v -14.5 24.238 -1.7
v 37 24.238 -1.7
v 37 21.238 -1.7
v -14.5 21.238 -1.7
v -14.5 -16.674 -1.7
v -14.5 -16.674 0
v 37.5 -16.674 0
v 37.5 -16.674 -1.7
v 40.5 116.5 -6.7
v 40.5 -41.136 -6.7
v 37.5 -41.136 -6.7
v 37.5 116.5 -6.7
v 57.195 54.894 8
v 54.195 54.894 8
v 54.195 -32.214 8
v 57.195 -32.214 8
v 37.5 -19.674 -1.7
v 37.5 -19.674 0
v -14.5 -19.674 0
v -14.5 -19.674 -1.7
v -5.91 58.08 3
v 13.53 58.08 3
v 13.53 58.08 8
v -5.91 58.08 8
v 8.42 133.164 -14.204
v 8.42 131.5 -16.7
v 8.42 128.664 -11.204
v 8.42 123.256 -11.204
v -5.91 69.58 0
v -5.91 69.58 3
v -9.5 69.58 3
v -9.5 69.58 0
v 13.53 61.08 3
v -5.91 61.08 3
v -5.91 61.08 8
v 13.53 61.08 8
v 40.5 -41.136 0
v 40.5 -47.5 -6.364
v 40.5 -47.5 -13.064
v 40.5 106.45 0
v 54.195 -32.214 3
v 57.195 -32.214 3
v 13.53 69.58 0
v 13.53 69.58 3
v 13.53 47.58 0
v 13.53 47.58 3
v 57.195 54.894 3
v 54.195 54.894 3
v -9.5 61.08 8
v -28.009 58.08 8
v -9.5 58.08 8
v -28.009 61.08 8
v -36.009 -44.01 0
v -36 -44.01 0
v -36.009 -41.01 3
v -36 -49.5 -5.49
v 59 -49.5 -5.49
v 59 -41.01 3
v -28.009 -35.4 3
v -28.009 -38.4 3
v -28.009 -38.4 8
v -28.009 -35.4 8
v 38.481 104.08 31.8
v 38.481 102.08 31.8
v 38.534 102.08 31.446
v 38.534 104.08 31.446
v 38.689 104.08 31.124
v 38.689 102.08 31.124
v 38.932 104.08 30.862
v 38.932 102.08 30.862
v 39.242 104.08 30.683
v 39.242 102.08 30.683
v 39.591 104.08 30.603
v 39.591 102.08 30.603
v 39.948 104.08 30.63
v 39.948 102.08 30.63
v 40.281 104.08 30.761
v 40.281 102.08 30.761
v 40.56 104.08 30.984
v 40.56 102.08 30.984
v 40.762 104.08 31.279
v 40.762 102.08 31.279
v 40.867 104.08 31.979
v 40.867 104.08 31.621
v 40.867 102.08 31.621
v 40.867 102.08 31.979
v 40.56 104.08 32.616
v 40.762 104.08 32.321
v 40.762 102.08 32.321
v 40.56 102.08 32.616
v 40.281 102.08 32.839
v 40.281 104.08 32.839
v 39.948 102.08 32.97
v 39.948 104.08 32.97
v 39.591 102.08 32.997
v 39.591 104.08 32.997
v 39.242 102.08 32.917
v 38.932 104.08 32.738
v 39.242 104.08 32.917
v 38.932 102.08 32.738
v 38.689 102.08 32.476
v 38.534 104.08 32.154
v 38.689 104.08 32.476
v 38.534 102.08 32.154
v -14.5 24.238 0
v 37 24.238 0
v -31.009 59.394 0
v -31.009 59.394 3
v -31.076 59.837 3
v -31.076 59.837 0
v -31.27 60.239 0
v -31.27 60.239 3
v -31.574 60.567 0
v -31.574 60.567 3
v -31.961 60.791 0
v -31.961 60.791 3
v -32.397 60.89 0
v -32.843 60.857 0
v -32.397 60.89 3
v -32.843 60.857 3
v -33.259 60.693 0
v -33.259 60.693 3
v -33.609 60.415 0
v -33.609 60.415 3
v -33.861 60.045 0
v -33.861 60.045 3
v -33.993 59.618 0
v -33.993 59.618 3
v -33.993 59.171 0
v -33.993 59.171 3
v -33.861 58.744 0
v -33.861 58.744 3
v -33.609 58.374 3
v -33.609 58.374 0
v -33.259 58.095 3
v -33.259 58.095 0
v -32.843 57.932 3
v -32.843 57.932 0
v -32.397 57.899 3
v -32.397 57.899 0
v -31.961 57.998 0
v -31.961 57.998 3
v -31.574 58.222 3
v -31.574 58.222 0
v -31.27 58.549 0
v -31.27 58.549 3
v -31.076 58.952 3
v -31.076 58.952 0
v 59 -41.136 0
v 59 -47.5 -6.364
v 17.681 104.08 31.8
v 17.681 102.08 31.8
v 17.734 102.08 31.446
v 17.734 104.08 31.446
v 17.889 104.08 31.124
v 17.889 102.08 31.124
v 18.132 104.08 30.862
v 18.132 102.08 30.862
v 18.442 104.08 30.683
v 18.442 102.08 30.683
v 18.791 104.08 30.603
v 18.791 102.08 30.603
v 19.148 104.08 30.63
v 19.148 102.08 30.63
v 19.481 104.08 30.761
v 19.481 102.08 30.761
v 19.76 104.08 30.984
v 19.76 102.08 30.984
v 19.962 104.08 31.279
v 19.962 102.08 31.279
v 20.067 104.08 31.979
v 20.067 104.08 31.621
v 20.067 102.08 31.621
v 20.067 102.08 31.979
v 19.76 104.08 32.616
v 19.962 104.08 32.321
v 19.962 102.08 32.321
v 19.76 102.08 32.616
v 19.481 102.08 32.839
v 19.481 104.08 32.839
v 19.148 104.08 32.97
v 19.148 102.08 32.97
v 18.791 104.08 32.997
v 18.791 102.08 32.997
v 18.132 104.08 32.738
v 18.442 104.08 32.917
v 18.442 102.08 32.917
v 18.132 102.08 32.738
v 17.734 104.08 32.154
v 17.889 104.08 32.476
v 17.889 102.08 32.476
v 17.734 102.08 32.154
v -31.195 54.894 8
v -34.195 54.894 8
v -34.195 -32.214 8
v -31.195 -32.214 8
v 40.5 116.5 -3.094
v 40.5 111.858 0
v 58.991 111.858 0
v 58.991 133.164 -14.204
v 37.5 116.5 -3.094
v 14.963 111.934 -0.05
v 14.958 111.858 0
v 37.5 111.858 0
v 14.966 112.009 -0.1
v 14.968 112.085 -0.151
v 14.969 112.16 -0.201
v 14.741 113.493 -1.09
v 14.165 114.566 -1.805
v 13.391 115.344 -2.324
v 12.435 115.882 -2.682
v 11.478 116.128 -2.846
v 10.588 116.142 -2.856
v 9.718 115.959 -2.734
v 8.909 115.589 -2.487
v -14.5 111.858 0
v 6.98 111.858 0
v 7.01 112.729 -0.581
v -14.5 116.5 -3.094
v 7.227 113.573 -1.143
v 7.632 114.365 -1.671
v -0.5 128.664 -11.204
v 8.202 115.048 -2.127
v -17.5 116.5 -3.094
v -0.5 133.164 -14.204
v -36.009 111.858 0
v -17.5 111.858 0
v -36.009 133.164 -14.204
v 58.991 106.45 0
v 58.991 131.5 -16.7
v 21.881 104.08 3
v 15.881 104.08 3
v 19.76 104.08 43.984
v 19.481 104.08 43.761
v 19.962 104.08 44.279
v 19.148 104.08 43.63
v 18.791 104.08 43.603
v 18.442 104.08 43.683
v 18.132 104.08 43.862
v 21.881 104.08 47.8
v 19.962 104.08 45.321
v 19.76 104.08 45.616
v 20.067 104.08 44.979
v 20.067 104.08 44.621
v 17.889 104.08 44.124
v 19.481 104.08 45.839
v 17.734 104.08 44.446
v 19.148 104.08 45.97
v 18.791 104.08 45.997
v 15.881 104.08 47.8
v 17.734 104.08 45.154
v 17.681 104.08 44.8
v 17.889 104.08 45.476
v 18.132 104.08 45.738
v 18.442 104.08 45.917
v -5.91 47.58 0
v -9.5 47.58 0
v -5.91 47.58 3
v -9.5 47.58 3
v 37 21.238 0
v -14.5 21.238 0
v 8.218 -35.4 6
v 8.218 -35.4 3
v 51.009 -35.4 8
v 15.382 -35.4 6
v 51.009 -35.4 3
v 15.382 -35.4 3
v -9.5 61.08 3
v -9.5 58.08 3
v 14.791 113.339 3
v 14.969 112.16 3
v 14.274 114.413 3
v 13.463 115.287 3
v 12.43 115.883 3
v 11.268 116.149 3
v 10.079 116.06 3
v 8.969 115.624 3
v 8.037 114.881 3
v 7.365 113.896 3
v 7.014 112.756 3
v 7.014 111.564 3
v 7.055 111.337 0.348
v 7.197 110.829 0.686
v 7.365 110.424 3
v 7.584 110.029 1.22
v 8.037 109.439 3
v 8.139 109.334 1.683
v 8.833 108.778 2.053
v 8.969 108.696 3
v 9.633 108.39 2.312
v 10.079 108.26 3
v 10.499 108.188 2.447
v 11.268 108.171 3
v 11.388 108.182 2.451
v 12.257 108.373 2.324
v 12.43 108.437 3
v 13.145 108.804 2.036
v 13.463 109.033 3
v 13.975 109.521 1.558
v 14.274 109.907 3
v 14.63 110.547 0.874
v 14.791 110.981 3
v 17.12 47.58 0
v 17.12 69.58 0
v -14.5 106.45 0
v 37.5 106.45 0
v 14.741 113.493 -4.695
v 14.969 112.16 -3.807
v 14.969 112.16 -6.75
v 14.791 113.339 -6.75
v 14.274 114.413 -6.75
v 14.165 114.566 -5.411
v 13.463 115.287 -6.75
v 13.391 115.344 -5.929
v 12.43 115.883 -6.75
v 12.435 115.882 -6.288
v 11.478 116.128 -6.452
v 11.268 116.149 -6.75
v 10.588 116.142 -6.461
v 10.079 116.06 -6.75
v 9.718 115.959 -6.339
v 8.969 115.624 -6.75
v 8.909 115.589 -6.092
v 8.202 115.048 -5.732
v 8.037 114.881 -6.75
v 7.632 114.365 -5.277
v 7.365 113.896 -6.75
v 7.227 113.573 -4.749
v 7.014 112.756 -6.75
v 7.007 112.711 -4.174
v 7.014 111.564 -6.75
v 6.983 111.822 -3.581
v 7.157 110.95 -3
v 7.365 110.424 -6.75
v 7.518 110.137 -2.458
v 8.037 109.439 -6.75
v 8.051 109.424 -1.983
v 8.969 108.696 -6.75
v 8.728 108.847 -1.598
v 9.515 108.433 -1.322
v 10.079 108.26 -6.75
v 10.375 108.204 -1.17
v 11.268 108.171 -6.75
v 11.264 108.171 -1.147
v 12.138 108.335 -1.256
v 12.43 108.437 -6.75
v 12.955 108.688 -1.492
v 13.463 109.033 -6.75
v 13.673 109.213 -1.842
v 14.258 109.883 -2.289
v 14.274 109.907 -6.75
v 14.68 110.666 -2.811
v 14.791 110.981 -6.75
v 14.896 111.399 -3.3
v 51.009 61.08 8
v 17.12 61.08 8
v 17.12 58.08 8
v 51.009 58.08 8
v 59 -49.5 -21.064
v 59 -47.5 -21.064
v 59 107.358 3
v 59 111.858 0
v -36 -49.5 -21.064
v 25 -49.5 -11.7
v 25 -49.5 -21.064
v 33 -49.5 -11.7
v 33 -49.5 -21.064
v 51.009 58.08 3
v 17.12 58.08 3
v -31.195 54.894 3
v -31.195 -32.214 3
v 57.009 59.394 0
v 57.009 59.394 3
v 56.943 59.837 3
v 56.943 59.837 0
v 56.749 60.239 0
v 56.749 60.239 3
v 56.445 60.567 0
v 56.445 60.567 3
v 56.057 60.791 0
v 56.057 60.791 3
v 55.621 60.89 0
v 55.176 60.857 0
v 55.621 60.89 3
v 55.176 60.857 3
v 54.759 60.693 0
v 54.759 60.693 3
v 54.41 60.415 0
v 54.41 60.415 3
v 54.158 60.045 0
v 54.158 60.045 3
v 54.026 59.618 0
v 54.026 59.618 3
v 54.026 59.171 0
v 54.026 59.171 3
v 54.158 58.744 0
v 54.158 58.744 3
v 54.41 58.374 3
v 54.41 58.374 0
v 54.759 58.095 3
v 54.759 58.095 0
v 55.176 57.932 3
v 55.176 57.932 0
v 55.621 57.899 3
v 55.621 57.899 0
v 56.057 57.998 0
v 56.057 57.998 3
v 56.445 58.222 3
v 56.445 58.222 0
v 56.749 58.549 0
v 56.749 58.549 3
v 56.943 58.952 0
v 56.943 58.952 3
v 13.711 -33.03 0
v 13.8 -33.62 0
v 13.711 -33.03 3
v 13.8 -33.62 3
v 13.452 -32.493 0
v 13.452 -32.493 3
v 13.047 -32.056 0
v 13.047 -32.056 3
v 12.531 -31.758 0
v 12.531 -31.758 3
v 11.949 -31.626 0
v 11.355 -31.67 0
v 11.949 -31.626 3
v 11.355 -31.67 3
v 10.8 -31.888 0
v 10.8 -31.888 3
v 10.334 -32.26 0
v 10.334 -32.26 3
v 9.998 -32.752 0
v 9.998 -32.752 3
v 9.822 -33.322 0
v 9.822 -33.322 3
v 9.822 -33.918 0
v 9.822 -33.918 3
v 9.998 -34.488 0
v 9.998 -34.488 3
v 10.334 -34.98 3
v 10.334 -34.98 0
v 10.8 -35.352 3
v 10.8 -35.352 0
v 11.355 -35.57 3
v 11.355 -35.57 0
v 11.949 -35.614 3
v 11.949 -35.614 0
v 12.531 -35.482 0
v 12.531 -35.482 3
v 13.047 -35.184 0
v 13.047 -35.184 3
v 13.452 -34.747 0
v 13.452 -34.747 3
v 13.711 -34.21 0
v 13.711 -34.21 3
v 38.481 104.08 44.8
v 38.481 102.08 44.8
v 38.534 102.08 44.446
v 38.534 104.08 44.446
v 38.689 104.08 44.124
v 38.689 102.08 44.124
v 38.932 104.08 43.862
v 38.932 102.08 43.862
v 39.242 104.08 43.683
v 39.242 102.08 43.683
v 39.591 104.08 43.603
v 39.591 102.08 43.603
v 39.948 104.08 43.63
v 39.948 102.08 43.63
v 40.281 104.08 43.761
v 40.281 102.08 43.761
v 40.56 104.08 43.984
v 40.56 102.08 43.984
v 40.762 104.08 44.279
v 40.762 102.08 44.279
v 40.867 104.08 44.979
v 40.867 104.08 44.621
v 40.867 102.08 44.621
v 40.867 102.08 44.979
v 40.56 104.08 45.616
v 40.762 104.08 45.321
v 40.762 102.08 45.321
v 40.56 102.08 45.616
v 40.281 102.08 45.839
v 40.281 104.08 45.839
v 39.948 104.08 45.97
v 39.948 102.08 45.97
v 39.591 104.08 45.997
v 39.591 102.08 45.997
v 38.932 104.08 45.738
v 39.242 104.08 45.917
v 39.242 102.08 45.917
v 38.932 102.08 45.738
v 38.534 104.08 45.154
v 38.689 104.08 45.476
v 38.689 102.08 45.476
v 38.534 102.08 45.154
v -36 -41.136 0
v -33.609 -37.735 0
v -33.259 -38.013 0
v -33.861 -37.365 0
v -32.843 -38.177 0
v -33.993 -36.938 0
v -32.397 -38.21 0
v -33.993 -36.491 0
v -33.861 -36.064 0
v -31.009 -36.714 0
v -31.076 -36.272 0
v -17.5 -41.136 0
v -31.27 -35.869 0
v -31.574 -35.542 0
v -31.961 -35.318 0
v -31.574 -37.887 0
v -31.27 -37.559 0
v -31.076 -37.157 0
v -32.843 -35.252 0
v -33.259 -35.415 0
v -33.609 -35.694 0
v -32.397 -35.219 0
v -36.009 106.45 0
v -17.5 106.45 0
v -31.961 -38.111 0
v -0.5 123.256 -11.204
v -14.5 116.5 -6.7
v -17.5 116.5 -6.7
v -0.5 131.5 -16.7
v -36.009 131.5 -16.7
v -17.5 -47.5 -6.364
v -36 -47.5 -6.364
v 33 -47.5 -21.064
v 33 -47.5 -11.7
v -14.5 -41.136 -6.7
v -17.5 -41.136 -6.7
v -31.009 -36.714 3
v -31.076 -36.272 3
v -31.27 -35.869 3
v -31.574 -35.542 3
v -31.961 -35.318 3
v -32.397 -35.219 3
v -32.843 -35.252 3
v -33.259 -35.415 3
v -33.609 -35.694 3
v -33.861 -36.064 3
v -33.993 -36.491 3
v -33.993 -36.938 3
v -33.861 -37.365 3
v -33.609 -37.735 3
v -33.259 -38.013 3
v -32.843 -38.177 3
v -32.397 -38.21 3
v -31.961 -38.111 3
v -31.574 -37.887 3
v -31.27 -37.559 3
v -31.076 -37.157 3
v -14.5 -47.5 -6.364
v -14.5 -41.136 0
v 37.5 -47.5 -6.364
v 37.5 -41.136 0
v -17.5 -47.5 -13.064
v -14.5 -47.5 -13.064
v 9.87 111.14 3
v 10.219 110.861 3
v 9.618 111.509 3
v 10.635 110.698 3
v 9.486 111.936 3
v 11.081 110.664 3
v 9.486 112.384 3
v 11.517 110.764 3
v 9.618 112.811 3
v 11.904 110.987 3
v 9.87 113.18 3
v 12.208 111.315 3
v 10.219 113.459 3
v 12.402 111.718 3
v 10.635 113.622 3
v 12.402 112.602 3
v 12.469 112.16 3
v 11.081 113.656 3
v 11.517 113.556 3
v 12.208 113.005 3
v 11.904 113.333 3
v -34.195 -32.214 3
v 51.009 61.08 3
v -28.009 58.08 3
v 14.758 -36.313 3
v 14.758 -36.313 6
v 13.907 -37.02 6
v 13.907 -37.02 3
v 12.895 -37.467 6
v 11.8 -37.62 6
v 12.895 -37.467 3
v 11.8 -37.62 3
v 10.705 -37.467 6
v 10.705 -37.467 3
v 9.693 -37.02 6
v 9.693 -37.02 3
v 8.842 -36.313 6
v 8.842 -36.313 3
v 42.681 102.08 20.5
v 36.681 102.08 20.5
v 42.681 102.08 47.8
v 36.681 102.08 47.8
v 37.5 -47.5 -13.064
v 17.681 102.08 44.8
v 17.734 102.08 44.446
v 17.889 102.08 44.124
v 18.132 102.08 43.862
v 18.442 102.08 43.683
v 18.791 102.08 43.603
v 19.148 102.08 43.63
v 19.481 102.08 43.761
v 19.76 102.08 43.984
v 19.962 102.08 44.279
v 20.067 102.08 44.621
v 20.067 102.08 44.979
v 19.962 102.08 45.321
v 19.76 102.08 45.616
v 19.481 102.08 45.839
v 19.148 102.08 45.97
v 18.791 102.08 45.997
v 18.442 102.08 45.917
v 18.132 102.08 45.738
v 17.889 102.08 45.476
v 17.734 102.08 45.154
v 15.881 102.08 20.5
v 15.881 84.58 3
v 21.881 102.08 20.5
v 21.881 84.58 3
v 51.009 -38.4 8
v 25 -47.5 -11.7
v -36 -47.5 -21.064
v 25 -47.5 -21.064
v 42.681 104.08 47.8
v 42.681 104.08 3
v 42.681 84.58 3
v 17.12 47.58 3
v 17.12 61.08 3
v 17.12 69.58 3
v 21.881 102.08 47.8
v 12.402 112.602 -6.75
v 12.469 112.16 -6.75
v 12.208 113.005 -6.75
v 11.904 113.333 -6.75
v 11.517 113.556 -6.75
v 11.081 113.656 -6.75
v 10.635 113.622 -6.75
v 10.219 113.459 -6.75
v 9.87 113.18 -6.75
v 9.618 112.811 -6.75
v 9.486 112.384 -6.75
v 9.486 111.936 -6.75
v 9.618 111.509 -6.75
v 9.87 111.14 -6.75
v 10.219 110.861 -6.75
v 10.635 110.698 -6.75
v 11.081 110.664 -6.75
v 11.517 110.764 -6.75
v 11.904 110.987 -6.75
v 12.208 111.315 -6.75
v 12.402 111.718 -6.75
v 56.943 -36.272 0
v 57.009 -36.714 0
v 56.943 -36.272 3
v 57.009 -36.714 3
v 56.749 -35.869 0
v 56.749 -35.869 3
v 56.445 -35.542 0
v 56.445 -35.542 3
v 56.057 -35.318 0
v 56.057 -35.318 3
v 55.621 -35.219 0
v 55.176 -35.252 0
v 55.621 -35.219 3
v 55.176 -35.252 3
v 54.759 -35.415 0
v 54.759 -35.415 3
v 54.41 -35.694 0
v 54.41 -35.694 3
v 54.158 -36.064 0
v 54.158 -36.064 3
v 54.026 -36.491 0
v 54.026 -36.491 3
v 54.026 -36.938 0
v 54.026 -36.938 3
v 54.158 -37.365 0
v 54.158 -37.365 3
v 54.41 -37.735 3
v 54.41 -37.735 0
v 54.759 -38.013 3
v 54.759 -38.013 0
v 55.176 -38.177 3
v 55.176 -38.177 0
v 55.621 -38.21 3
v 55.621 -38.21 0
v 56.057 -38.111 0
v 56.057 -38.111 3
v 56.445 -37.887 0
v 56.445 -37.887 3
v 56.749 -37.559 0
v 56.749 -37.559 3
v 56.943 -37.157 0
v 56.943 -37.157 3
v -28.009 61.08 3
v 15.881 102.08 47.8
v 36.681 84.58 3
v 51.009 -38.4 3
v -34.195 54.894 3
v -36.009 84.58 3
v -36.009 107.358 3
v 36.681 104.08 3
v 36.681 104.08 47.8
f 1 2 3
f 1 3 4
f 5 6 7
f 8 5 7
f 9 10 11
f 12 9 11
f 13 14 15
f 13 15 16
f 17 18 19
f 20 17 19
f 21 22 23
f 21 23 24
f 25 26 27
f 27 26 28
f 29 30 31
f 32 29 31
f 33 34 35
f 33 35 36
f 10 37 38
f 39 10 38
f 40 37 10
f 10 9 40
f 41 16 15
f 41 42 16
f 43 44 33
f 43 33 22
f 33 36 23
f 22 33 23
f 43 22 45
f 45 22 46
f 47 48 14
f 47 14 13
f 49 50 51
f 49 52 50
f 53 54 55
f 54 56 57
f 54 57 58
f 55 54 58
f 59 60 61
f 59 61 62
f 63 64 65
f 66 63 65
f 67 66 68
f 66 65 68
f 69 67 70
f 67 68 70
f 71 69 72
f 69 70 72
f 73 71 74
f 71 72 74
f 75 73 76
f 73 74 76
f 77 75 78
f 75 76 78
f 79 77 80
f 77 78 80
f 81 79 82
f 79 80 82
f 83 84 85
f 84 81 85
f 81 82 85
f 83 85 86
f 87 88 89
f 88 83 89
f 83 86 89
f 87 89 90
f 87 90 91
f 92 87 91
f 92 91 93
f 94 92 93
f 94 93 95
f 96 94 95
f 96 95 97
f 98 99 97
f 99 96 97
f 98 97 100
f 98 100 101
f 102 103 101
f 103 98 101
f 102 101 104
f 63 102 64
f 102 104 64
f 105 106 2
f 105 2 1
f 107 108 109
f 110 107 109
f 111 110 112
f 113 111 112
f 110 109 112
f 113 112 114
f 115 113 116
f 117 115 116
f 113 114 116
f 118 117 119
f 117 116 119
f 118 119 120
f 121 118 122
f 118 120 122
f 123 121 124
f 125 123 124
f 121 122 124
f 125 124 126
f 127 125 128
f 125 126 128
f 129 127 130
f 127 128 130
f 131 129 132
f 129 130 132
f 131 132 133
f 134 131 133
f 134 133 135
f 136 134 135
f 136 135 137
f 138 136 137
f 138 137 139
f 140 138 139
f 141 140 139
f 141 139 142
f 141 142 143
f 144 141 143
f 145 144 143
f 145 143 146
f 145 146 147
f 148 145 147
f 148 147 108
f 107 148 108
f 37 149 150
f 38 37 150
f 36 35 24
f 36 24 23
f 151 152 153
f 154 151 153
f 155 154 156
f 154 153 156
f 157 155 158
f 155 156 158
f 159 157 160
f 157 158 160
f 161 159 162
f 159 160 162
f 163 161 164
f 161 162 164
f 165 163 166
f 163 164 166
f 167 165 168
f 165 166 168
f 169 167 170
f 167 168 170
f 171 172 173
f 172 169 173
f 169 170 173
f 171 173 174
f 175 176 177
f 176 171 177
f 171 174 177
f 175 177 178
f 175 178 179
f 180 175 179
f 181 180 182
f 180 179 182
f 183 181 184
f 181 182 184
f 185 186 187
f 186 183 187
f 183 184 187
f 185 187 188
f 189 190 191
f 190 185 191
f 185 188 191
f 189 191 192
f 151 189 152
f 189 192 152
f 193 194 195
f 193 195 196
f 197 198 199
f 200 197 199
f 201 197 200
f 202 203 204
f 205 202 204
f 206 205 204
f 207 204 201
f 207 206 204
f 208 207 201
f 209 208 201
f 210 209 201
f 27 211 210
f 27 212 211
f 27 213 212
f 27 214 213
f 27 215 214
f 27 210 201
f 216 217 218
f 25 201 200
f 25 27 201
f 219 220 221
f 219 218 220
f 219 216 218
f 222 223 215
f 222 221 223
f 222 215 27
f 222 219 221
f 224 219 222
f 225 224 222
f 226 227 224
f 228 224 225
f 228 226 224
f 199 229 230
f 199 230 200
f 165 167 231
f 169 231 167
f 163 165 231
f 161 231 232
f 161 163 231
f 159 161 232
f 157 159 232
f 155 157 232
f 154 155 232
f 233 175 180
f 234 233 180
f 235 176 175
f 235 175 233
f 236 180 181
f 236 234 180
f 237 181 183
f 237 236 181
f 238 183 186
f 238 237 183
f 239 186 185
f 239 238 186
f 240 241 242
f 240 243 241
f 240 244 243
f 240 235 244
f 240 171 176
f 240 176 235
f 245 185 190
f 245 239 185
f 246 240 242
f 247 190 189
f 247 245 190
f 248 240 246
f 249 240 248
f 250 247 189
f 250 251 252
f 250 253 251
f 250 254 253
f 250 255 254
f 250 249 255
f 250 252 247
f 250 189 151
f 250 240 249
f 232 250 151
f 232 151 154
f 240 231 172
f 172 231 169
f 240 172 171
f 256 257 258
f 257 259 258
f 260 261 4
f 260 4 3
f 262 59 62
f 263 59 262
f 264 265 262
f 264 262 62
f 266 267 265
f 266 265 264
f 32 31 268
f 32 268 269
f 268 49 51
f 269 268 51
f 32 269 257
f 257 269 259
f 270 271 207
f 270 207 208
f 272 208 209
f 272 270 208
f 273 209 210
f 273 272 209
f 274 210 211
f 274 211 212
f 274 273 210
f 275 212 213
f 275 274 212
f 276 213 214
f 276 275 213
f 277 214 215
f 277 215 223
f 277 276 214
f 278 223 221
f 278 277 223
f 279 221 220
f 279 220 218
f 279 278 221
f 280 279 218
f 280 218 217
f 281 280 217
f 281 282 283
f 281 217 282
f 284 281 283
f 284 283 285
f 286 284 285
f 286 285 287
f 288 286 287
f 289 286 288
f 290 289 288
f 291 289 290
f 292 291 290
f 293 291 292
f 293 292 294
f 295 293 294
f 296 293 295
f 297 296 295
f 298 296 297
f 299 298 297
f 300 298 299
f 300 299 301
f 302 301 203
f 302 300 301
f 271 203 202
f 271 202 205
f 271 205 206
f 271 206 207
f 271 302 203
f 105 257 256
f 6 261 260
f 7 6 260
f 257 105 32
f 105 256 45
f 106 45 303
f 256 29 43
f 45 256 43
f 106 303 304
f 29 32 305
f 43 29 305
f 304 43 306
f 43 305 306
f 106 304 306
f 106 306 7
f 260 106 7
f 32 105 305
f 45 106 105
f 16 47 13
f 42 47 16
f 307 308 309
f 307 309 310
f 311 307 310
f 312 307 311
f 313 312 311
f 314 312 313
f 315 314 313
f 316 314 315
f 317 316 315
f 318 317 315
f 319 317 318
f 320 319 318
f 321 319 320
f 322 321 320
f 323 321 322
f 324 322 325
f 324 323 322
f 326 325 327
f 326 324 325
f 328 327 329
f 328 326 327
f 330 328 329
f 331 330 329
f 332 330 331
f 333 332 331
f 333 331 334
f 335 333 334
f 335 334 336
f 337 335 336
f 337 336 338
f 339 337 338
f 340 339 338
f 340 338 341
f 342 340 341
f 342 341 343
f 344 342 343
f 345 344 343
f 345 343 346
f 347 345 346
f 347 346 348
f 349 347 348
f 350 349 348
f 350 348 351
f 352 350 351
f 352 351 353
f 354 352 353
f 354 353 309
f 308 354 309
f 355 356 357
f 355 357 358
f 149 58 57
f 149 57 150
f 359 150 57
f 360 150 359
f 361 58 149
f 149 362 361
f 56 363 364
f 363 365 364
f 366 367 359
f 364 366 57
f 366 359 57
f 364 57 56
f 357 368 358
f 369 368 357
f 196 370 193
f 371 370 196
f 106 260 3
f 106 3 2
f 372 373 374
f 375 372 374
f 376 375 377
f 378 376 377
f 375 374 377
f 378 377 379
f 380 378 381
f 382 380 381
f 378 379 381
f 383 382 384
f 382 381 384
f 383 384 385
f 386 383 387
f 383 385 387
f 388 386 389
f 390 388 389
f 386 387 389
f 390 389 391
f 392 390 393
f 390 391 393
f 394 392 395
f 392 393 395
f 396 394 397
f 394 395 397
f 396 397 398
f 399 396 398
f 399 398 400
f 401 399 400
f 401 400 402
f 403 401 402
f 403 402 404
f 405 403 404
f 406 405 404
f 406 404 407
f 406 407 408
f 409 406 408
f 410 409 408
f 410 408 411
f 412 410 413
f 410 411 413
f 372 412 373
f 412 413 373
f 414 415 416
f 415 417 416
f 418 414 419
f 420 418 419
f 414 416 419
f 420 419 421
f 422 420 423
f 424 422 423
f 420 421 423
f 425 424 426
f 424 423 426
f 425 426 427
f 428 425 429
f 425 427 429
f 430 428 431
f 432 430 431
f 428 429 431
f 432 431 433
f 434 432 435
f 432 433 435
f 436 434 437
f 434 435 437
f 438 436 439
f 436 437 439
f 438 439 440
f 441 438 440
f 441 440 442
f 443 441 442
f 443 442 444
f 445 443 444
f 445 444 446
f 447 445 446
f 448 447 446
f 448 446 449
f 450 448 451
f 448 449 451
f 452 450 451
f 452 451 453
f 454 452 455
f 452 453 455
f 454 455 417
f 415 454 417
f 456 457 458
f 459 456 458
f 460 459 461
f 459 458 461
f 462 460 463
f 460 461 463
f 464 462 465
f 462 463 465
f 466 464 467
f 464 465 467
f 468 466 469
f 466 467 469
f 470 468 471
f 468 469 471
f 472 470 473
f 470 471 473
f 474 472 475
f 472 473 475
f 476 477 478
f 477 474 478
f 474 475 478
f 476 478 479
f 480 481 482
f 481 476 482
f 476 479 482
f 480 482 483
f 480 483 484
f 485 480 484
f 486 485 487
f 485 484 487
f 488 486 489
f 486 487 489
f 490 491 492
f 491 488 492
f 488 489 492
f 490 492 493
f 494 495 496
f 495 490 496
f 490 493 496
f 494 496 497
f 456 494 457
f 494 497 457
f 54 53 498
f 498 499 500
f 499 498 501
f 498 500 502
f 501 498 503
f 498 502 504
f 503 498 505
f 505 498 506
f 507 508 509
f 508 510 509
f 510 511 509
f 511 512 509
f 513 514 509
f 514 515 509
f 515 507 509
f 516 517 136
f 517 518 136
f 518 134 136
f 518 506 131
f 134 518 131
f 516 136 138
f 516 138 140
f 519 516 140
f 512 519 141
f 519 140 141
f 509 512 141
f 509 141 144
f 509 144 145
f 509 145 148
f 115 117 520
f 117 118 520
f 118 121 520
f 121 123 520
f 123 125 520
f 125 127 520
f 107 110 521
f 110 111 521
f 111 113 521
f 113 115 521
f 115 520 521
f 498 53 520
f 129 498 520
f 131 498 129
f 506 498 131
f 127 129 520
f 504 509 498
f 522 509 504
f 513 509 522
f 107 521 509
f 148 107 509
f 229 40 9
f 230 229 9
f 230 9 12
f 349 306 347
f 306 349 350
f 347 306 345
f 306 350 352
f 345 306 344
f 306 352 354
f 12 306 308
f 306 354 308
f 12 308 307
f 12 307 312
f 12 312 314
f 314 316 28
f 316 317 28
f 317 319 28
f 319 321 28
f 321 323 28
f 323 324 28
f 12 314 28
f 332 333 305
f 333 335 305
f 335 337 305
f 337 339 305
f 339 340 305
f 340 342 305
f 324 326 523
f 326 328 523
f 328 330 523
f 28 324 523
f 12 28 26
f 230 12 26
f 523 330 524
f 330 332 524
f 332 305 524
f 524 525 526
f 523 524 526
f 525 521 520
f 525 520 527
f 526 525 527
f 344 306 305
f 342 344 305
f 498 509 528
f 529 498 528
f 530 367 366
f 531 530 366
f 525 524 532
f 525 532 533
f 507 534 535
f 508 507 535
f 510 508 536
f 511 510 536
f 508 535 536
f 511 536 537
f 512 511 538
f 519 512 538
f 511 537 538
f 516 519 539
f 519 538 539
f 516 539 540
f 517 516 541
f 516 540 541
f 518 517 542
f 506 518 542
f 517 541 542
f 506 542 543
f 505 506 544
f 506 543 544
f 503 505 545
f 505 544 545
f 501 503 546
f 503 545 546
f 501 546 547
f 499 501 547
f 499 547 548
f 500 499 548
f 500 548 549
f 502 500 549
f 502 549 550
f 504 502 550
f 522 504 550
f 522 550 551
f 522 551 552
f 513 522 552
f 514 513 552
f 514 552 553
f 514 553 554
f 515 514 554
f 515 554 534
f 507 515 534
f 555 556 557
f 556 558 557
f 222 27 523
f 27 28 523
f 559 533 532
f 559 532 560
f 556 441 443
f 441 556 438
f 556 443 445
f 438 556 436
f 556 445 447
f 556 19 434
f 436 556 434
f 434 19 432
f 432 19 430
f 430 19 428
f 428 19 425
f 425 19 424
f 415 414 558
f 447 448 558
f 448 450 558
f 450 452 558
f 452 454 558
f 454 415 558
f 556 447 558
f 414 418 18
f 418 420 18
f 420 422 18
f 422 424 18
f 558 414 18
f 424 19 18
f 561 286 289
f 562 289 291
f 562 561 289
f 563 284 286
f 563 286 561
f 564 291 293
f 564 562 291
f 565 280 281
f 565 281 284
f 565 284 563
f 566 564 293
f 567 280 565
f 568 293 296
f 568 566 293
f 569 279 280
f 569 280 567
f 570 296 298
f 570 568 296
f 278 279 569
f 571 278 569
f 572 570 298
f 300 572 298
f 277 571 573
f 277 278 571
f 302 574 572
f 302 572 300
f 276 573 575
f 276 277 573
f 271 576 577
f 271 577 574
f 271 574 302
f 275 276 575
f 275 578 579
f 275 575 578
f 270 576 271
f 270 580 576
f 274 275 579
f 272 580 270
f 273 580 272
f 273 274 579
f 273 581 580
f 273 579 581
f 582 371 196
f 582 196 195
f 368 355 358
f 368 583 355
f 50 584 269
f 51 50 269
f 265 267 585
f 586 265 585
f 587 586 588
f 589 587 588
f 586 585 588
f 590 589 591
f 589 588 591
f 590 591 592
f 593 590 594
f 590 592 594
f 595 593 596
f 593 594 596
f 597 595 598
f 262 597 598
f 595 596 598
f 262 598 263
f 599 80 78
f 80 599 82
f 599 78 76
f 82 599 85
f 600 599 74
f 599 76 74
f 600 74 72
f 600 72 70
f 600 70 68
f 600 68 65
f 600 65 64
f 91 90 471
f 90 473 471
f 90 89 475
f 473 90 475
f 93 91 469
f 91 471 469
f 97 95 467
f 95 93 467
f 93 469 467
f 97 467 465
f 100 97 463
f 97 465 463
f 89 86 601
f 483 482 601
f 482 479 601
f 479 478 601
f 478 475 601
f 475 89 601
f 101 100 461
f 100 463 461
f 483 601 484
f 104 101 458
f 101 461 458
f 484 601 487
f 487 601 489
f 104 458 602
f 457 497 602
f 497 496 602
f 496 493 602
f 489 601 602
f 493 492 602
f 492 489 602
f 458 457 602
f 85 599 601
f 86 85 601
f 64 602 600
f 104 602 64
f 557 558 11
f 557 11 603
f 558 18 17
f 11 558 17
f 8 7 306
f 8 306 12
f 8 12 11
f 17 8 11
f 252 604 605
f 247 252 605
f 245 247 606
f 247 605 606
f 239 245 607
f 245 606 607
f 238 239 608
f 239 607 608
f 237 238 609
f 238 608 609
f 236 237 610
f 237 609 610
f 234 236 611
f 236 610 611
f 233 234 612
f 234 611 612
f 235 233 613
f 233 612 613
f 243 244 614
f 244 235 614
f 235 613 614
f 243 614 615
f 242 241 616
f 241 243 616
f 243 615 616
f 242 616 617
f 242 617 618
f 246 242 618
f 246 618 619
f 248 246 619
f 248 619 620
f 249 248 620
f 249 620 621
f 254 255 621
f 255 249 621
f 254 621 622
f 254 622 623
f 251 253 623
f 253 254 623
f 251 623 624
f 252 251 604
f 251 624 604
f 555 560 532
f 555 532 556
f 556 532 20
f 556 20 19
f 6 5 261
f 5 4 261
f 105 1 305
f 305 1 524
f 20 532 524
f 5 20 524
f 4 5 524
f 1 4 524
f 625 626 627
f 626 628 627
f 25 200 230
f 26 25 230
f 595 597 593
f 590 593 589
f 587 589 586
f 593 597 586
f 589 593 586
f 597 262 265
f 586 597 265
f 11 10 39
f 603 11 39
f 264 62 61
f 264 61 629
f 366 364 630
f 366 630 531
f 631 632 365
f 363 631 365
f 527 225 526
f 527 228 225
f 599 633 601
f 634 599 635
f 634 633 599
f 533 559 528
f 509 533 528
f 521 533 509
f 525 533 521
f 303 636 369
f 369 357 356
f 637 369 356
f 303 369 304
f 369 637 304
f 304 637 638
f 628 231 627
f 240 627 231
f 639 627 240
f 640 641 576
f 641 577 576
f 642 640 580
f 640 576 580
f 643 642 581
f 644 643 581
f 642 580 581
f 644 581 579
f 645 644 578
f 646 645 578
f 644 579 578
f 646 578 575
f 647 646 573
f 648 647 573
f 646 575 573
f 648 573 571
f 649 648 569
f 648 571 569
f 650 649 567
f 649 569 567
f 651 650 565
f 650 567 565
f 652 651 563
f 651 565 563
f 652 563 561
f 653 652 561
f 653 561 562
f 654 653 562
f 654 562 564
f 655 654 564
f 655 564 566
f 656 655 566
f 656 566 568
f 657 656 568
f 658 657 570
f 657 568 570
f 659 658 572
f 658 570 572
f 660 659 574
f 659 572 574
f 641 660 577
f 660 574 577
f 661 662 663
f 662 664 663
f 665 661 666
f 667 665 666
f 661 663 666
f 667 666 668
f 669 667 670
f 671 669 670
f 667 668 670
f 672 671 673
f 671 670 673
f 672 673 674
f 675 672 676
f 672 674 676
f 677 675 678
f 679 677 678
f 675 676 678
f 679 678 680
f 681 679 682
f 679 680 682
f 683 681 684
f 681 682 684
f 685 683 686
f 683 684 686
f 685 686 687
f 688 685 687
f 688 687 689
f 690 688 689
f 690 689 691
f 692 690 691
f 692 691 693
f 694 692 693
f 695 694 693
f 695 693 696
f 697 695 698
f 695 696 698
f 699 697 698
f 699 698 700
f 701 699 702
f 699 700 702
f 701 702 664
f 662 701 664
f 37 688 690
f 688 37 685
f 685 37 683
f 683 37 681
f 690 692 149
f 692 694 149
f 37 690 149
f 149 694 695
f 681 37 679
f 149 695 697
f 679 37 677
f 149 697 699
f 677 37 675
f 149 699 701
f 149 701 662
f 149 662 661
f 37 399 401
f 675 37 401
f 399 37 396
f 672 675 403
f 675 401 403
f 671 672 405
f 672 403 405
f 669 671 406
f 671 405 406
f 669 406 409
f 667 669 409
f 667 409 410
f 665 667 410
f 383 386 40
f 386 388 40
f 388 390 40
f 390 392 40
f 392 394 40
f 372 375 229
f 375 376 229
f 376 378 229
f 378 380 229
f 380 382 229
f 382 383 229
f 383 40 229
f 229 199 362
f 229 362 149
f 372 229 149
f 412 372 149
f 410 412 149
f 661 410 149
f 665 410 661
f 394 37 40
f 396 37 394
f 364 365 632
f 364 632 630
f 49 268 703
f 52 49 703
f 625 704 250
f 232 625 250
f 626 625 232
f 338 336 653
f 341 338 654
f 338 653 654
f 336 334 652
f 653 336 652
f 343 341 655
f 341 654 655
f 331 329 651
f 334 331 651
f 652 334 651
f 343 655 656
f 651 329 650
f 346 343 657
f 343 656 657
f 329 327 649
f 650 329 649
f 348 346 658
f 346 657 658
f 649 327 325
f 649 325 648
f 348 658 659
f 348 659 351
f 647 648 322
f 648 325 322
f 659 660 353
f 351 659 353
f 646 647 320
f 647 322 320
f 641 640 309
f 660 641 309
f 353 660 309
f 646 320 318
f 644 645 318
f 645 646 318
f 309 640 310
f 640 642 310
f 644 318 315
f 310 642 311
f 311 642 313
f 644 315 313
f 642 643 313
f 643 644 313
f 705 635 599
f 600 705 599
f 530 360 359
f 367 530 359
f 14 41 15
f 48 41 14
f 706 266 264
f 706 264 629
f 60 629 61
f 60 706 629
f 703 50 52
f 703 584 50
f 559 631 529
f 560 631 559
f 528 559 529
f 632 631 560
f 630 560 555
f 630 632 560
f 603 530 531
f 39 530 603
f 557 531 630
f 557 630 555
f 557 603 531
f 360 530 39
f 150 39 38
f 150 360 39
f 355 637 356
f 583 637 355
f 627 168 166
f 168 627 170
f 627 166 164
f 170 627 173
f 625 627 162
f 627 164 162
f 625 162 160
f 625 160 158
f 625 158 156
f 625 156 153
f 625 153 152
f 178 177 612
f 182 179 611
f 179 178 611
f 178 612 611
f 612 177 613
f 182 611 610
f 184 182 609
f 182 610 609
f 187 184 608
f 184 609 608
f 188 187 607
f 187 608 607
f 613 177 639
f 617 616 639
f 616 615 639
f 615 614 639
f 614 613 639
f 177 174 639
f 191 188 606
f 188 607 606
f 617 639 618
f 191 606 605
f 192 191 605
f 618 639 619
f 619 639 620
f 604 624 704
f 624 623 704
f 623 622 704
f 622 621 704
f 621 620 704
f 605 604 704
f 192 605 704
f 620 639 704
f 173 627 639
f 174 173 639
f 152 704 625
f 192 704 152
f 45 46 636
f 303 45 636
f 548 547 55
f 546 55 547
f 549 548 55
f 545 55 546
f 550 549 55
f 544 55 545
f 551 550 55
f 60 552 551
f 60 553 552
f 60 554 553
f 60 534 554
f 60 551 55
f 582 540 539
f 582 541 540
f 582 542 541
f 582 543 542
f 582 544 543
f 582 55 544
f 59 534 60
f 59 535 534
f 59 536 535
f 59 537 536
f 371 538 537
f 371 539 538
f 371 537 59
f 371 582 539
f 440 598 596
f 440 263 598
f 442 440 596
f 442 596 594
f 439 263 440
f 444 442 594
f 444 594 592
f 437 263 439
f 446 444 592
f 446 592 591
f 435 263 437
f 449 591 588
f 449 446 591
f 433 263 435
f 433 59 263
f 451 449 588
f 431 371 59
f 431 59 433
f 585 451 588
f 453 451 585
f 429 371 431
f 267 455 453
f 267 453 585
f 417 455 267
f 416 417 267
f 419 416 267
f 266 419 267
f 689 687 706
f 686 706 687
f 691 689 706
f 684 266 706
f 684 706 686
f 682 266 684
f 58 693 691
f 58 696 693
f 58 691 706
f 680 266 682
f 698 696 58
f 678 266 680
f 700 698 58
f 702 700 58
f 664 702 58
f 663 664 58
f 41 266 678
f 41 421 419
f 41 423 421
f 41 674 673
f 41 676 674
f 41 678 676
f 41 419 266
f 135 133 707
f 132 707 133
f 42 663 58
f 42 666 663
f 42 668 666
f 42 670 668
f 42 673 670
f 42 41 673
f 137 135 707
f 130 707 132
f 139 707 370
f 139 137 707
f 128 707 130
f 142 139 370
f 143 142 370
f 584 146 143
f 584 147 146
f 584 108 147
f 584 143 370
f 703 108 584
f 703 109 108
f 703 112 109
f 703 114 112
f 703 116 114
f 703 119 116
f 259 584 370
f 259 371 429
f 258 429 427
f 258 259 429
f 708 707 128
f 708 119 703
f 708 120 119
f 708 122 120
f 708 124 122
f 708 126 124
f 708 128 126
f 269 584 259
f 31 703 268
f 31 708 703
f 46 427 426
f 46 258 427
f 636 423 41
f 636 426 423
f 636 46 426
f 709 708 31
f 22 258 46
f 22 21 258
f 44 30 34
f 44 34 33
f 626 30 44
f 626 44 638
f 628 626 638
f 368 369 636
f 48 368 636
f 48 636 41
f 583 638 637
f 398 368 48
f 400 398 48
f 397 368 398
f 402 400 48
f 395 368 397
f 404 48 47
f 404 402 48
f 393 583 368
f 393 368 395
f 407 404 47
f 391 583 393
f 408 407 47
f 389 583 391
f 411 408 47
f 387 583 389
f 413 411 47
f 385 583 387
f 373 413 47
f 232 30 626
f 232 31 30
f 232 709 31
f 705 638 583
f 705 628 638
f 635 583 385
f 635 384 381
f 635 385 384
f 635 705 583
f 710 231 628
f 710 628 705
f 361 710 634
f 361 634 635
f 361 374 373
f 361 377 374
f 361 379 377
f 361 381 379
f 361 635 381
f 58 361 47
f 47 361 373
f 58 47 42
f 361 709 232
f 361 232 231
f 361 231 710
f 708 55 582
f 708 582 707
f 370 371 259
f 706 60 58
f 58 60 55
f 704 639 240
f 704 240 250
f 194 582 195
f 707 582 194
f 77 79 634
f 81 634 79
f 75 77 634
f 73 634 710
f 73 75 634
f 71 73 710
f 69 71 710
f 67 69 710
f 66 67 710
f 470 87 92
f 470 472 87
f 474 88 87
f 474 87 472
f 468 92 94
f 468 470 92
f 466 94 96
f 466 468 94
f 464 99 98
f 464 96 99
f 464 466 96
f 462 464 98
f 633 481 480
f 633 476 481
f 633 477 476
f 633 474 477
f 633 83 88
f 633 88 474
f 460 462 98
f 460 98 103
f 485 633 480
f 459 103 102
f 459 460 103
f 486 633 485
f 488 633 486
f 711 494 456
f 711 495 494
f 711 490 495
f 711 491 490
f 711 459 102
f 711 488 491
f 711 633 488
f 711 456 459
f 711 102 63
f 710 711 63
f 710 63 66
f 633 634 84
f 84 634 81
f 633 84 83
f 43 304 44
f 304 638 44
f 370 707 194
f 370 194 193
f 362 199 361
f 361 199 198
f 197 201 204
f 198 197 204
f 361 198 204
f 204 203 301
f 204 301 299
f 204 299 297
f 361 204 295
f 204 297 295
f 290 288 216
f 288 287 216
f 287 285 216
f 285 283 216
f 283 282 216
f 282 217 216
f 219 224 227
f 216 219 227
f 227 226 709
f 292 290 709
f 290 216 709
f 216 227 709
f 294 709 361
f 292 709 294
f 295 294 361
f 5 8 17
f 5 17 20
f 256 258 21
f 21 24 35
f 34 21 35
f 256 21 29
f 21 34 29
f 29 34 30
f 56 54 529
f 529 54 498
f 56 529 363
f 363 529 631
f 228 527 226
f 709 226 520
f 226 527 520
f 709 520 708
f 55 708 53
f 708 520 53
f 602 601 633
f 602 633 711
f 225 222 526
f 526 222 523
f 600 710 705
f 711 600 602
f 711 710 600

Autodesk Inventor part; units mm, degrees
ref_plane "YZ Plane" through (0, 0, 0) normal (1, 0, 0) x (0, 1, 0)
ref_plane "XZ Plane" through (0, 0, 0) normal (0, 1, 0) x (-1, 0, 0)
ref_plane "XY Plane" through (0, 0, 0) normal (0, 0, 1) x (1, 0, 0)
sketch "Sketch1" plane through (0, 0, 0) normal (0, 0, 1) x (1, 0, 0)
  line L0 (59, 131.5) -> (-36.0094, 131.5)
  line L1 (-36.0094, 131.5) -> (-36.0094, -49.2144)
  line L2 (-36.0094, -49.2144) -> (59, -49.2144)
  line L3 (59, -49.2144) -> (59, 131.5)
  point P0 (0, 0)
  point P1 (-36, 131.5)
  point P2 (59.0094, -49.2144)
extrude "Extrusion1" add sketch "Sketch1" along normal blind 3
sketch "Sketch2" plane through (0, 0, 3) normal (0, 0, 1) x (1, 0, 0)
  line L0 (16.62, 69.08) -> (14.03, 69.08)
  line L1 (14.03, 69.08) -> (14.03, 48.08)
  line L2 (14.03, 48.08) -> (16.62, 48.08)
  line L3 (16.62, 48.08) -> (16.62, 69.08)
  line L4 (-6.41, 48.08) -> (-6.41, 69.08)
  line L5 (-6.41, 69.08) -> (-9, 69.08)
  line L6 (-9, 69.08) -> (-9, 48.08)
  line L7 (-9, 48.08) -> (-6.41, 48.08)
  line L8 (59, 131.5) -> (-36.0094, 131.5)
  line L9 (-36.0094, 131.5) -> (-36.0094, -49.2144)
  line L10 (-36.0094, -49.2144) -> (59, -49.2144)
  line L11 (59, -49.2144) -> (59, 131.5)
  line L12 (17.12, 69.58) -> (13.53, 69.58)
  line L13 (13.53, 69.58) -> (13.53, 47.58)
  line L14 (13.53, 47.58) -> (17.12, 47.58)
  line L15 (17.12, 47.58) -> (17.12, 69.58)
  line L16 (-5.91, 69.58) -> (-9.5, 69.58)
  line L17 (-9.5, 69.58) -> (-9.5, 47.58)
  line L18 (-9.5, 47.58) -> (-5.91, 47.58)
  line L19 (-5.91, 47.58) -> (-5.91, 69.58)
  circle A0 centre (55.5094, 59.3944) radius 1.5
  circle A1 centre (55.5094, -36.7144) radius 1.5
  circle A2 centre (-32.5094, -36.7144) radius 1.5
  circle A3 centre (-32.5094, 59.3944) radius 1.5
  point P0 (0, 0)
extrude "Extrusion2" cut sketch "Sketch2" against normal up to next contours L3 L2 L1 L0 | L7 L6 L5 L4 | L15 L14 L13 L12 | L19 L18 L17 L16 | A0 | A1 | A2 | A3
sketch "Sketch3" plane through (0, 0, 3) normal (0, 0, 1) x (1, 0, 0)
  line L0 (-34.195, 54.8944) -> (-31.195, 54.8944) projected
  line L1 (-31.195, 54.8944) -> (-31.195, -32.2144) projected
  line L2 (-31.195, -32.2144) -> (-34.195, -32.2144) projected
  line L3 (-34.195, -32.2144) -> (-34.195, 54.8944) projected
  line L4 (54.195, 54.8944) -> (57.195, 54.8944) projected
  line L5 (57.195, 54.8944) -> (57.195, -32.2144) projected
  line L6 (57.195, -32.2144) -> (54.195, -32.2144) projected
  line L7 (54.195, -32.2144) -> (54.195, 54.8944) projected
  line L8 (-28.0094, -35.4) -> (51.0094, -35.4) projected
  line L9 (51.0094, -35.4) -> (51.0094, -38.4) projected
  line L10 (51.0094, -38.4) -> (-28.0094, -38.4) projected
  line L11 (-28.0094, -38.4) -> (-28.0094, -35.4) projected
  line L12 (51.0094, 61.08) -> (51.0094, 58.08) projected
  line L13 (-28.0094, 58.08) -> (-28.0094, 61.08) projected
  line L14 (17.12, 47.58) -> (17.12, 69.58) projected
  line L15 (51.0094, 58.08) -> (17.12, 58.08)
  line L16 (17.12, 58.08) -> (17.12, 61.08)
  line L17 (17.12, 61.08) -> (51.0094, 61.08)
  line L18 (51.0094, 61.08) -> (51.0094, 58.08)
  line L19 (13.53, 47.58) -> (13.53, 69.58) projected
  line L20 (-5.91, 69.58) -> (-5.91, 47.58) projected
  line L21 (13.53, 58.08) -> (-5.91, 58.08)
  line L22 (-5.91, 58.08) -> (-5.91, 61.08)
  line L23 (-5.91, 61.08) -> (13.53, 61.08)
  line L24 (13.53, 61.08) -> (13.53, 58.08)
  line L25 (-9.5, 47.58) -> (-9.5, 69.58) projected
  line L26 (-28.0094, 58.08) -> (-9.5, 58.08)
  line L27 (-9.5, 58.08) -> (-9.5, 61.08)
  line L28 (-9.5, 61.08) -> (-28.0094, 61.08)
  line L29 (-28.0094, 61.08) -> (-28.0094, 58.08)
  point P0 (0, 0)
extrude "Extrusion3" add sketch "Sketch3" along normal blind 5
sketch "Sketch4" plane through (0, 0, 0) normal (0, 0, -1) x (-1, 0, 0)
  line L0 (16, 116.5) -> (36, 116.5) projected
  line L1 (36, 116.5) -> (36, -41.136) projected
  line L2 (36, -41.136) -> (16, -41.136) projected
  line L3 (16, -41.136) -> (16, 116.5) projected
  line L4 (-59, 116.5) -> (-39, 116.5) projected
  line L5 (-39, 116.5) -> (-39, -41.136) projected
  line L6 (-39, -41.136) -> (-59, -41.136) projected
  line L7 (-59, -41.136) -> (-59, 116.5) projected
  line L8 (14.5, -41.136) -> (17.5, -41.136)
  line L9 (17.5, -41.136) -> (17.5, 116.5)
  line L10 (17.5, 116.5) -> (14.5, 116.5)
  line L11 (14.5, 116.5) -> (14.5, -41.136)
  line L12 (-37.5, 116.5) -> (-40.5, 116.5)
  line L13 (-40.5, 116.5) -> (-40.5, -41.136)
  line L14 (-40.5, -41.136) -> (-37.5, -41.136)
  line L15 (-37.5, -41.136) -> (-37.5, 116.5)
  point P0 (0, 0)
  dimension "d13" = 1.5
  dimension "d14" = 1.5
  dimension "d15" = 1.5
  dimension "d16" = 1.5
extrude "Extrusion4" add sketch "Sketch4" along normal blind 6.7 contours L0 L9 L2 L3 | L3 L8 L11 L10 | L4 L5 L6 L13 | L12 L15 L14 L5
sketch "Sketch5" plane through (0, 0, 0) normal (0, 0, -1) x (-1, 0, 0)
  line L0 (-37, -32) -> (-37, 32) projected
  line L1 (9, 32) -> (9, -32) projected
  line L2 (14.5, 116.5) -> (14.5, -41.136) projected
  line L3 (-37, 24.2384) -> (14.5, 24.2384)
  line L4 (14.5, 24.2384) -> (14.5, 21.2384)
  line L5 (14.5, 21.2384) -> (-37, 21.2384)
  line L6 (-37, 21.2384) -> (-37, 24.2384)
  line L7 (-37.5, 116.5) -> (-37.5, -41.136) projected
  line L8 (14.5, -16.674) -> (-37.5, -16.674)
  line L9 (-37.5, -16.674) -> (-37.5, -19.674)
  line L10 (-37.5, -19.674) -> (14.5, -19.674)
  line L11 (14.5, -19.674) -> (14.5, -16.674)
  point P0 (0, 0)
  dimension "d20" = 3
  dimension "d21" = 3
extrude "Extrusion5" add sketch "Sketch5" along normal blind 1.7 contours L0 L3 L1 L5 | L8 L1 L10 L0 | L0 L10 L7 L8 | L1 L3 L2 L5 | L8 L2 L10 L1
sketch "Sketch6" plane through (-36.0094, -49.2144, 0) normal (-1, 0, 0) x (0, 0, 1)
  line L0 (-6.7, 165.7144) -> (-16.7, 180.7144) projected
  line L1 (-16.7, 180.7144) -> (-44.2, 151.5422) projected
  line L2 (-44.2, -0.2856) -> (-44.2, 151.5422) projected
  line L3 (-21.064, -0.2856) -> (-44.2, -0.2856) projected
  line L4 (-21.064, 1.7144) -> (-21.064, -0.2856) projected
  line L5 (-21.064, 1.7144) -> (-13.064, 1.7144) projected
  line L6 (-13.064, 1.7144) -> (-6.7, 8.0784) projected
  line L7 (-6.7, 165.7144) -> (-6.7, 8.0784) projected
  line L8 (0, 180.7144) -> (0, 0) projected
  line L9 (0, 0) -> (3, 0) projected
  line L10 (3, 180.7144) -> (3, 0) projected
  line L11 (0, 180.7144) -> (3, 180.7144) projected
  line L12 (-16.7, 180.7144) -> (0, 155.6644)
  line L13 (0, 155.6644) -> (2.4962, 157.3285)
  line L14 (2.4962, 157.3285) -> (-14.2038, 182.3785)
  line L15 (-14.2038, 182.3785) -> (-16.7, 180.7144)
  point P0 (0, 49.2144)
  dimension "d24" = 3
  dimension "d25" = 0
extrude "Extrusion6" add sketch "Sketch6" against normal blind 95 contours L0 L15 L14 L8 L12 | L8 L14 L13
sketch "Sketch7" plane through (-36.0094, -49.2144, 3) normal (-1, 0, 0) x (0, 0, 1)
  line L0 (-3, 165.7144) -> (-6.0944, 165.7144) projected
  line L1 (-6.0944, 165.7144) -> (0.2976, 156.1263)
  line L2 (-3, 161.0727) -> (-6.0944, 165.7144) projected
  line L3 (0.2976, 156.1263) -> (0.2976, 182.9184)
  line L4 (0, 0) -> (0, 180.7144) projected
  line L5 (0.2976, 182.9184) -> (-5.3952, 181.9603)
  line L6 (-5.3952, 181.9603) -> (-6.0944, 165.7144)
  point P0 (-3, 49.2144)
extrude "Extrusion7" cut sketch "Sketch7" against normal blind 96
ref_plane "Work Plane1" through (16.62, 76.42, -7.3) normal (0, 1, 0) x (-1, 0, 0)
sketch "Sketch9" plane through (16.62, 76.42, -7.3) normal (0, 1, 0) x (-1, 0, 0)
  line L0 (0, 0) -> (8.7, 0) projected
  line L1 (8.7, 0) -> (8.7, -2.78) projected
  line L2 (16.62, -2.78) -> (8.7, -2.78) projected
  line L3 (16.62, 0) -> (16.62, -2.78) projected
  line L4 (16.62, 0) -> (25.62, 0) projected
  line L5 (25.62, 0) -> (25.62, 1.3) projected
  line L6 (0, 1.3) -> (25.62, 1.3) projected
  line L7 (0, 0) -> (0, 1.3) projected
  line L8 (8.2, -3.9038) -> (17.12, -3.9038)
  line L9 (17.12, -3.9038) -> (17.12, -9.4)
  line L10 (17.12, -9.4) -> (8.2, -9.4)
  line L11 (8.2, -9.4) -> (8.2, -3.9038)
  line L12 (52.6294, -6.9038) -> (52.6294, -9.4) projected
  line L13 (52.6294, -6.9038) -> (-42.3706, -6.9038) projected
  line L14 (-42.3706, -9.4) -> (-42.3706, -6.9038) projected
  line L15 (52.6294, -9.4) -> (-42.3706, -9.4) projected
  point P0 (16.62, 7.3)
  dimension "d35" = 0
  dimension "d36" = 3
  dimension "d37" = 0.5
  dimension "d38" = 0.5
extrude "Extrusion8" cut sketch "Sketch9" along normal through all contours L8 L9 L13 L11 | L13 L9 L10 L11
sketch "Sketch10" plane through (0, 0, 3) normal (0, 0, 1) x (1, 0, 0)
  circle A0 centre (10.9691, 112.16) radius 1.5 projected
  circle A1 centre (11.8, -33.62) radius 2 projected
  circle A2 centre (10.9691, 112.16) radius 4 projected
  arc A3 (8.1427, -32) -> (9, -30.7634) centre (11.8, -33.62) ccw projected
  circle A4 centre (11.8, -33.62) radius 4
  point P0 (0, 0)
extrude "Extrusion9" cut sketch "Sketch10" along normal blind 3 contours A1 | A4 A3
sketch "Sketch11" plane through (0, 0, 3) normal (0, 0, 1) x (1, 0, 0)
  circle A0 centre (10.9691, 112.16) radius 4 projected
  circle A1 centre (10.9691, 112.16) radius 1.5 projected
  point P0 (0, 0)
extrude "Extrusion10" add sketch "Sketch11" against normal blind 9.75 contours A0 | A1
sketch "Sketch12" plane through (10.9691, 112.16, 3) normal (0, 0, 1) x (1, 0, 0)
  circle A0 centre (0, 0) radius 4
  circle A1 centre (0, 0) radius 1.5 projected
  point P0 (-10.9691, -112.16)
extrude "Extrusion11" cut sketch "Sketch12" against normal up to next contours A1
sketch "Sketch13" plane through (0, 0, 3) normal (0, 0, 1) x (1, 0, 0)
  circle A0 centre (11.8, -33.62) radius 2 projected
  point P0 (0, 0)
extrude "Extrusion12" cut sketch "Sketch13" against normal up to next
sketch "Sketch15" plane through (59, -49.2144, 0) normal (1, 0, 0) x (0, 0, -1)
  line L0 (44.2, 151.5422) -> (16.7, 180.7144) projected
  line L1 (16.7, 180.7144) -> (6.7, 165.7144) projected
  line L2 (6.7, 8.0784) -> (6.7, 165.7144) projected
  line L3 (6.7, 8.0784) -> (13.064, 1.7144) projected
  line L4 (21.064, 1.7144) -> (13.064, 1.7144) projected
  line L5 (21.064, 1.7144) -> (21.064, -0.2856) projected
  line L6 (44.2, -0.2856) -> (21.064, -0.2856) projected
  line L7 (44.2, 151.5422) -> (44.2, -0.2856) projected
  line L8 (0, 8.0784) -> (0, 155.6644) projected
  line L9 (-3.0214, 8.0784) -> (0, 8.0784)
  line L10 (0, 8.0784) -> (6.364, 1.7144)
  line L11 (6.364, 1.7144) -> (21.064, 1.7144)
  line L12 (21.064, -0.2856) -> (5.4901, -0.2856)
  line L13 (5.4901, -0.2856) -> (-2.8739, 8.0784)
  point P0 (0, 49.2144)
  dimension "d51" = 135
  dimension "d52" = 45
extrude "Extrusion13" add sketch "Sketch15" against normal blind 95 contours L12 L13 L9 L10 L11 L4 L5
sketch "Sketch16" plane through (40.5, -41.136, -6.7) normal (1, 0, 0) x (0, 0, -1)
  line L0 (-6.7, 0) -> (-6.7, 152.9944) projected
  line L1 (-6.7, 152.9944) -> (-9.7, 148.4944) projected
  line L2 (-9.7, -8.0784) -> (-9.7, 148.4944) projected
  line L3 (-6.7, -8.0784) -> (-9.7, -8.0784) projected
  line L4 (-6.7, -8.0784) -> (-6.7, -2.8739) projected
  line L5 (-6.7, -2.8739) -> (-1.2099, -8.364) projected
  line L6 (-1.2099, -8.364) -> (14.364, -8.364) projected
  line L7 (14.364, -8.364) -> (14.364, -6.364) projected
  line L8 (14.364, -6.364) -> (-0.336, -6.364) projected
  line L9 (-0.336, -6.364) -> (-6.7, 0) projected
  line L10 (-6.7, 0) -> (0, 0) projected
  line L11 (0, 0) -> (6.364, -6.364)
  line L12 (14.364, -6.364) -> (-0.336, -6.364) projected
  line L13 (-0.336, -6.364) -> (-6.7, 0)
  point P0 (-6.7, 41.136)
extrude "Extrusion14" add sketch "Sketch16" against normal blind 3 contours L10 L11 L8 L9
sketch "Sketch17" plane through (-17.5, -41.136, -6.7) normal (-1, 0, 0) x (0, 0, 1)
  line L0 (6.7, 147.586) -> (0, 157.636) projected
  line L1 (0, 0) -> (0, 157.636) projected
  line L2 (0, 0) -> (-6.364, -6.364) projected
  line L3 (0.336, -6.364) -> (-6.364, -6.364) projected
  line L4 (6.7, 0) -> (0.336, -6.364) projected
  line L5 (6.7, 21.462) -> (6.7, 0) projected
  line L6 (6.7, 21.462) -> (5, 21.462) projected
  line L7 (5, 21.462) -> (5, 24.462) projected
  line L8 (5, 24.462) -> (6.7, 24.462) projected
  line L9 (6.7, 147.586) -> (6.7, 24.462) projected
  line L10 (-6.364, -6.364) -> (0, 0) projected
  line L11 (0, 0) -> (-6.364, -6.364)
  line L12 (-6.364, -6.364) -> (0.336, -6.364) projected
  line L13 (-6.364, -6.364) -> (0.336, -6.364)
  line L14 (0.336, -6.364) -> (6.7, 0) projected
  line L15 (0.336, -6.364) -> (6.7, 0)
  line L16 (6.7, 0) -> (0, 0)
  point P0 (6.7, 41.136)
extrude "Extrusion15" add sketch "Sketch17" against normal blind 3 contours L16 L4 L3 L2
sketch "Sketch18" plane through (59, -49.5, -21.064) normal (0, -1, 0) x (1, 0, 0)
  line L0 (-34, 0) -> (-26, 0) projected
  line L1 (-26, 0) -> (-26, 9.364) projected
  line L2 (-34, 9.364) -> (-26, 9.364) projected
  line L3 (-34, 0) -> (-34, 9.364) projected
  point P0 (-59, 21.064)
extrude "Extrusion16" cut sketch "Sketch18" against normal up to next
sketch "Sketch19" plane through (59, -49.2144, 3) normal (1, 0, 0) x (0, 0, -1)
  line L0 (3, 0) -> (3, 5.2045) projected
  line L1 (3, 5.2045) -> (0, 8.2045)
  line L2 (0, 0) -> (0, 156.5727) projected
  line L3 (3, 0) -> (0, 0) projected
  line L4 (0, 0) -> (3, 0)
  line L5 (3, 8.0784) -> (3, 5.2045) projected
  line L6 (3, 0) -> (3, 5.2045)
  point P0 (3, 49.2144)
  dimension "d61" = 45
extrude "Extrusion17" cut sketch "Sketch19" against normal through all
ref_plane "Work Plane2" through (29.2806, 102.08, 35) normal (0, 1, 0) x (-1, 0, 0)
sketch "Sketch20" plane through (29.2806, 102.08, 35) normal (0, 1, 0) x (-1, 0, 0)
  line L0 (-4.6, -7) -> (-4.6, 1) projected
  line L1 (-4.6, 1) -> (-5.4, 1) projected
  line L2 (-5.4, 1) -> (-5.4, 9) projected
  line L3 (-5.4, 9) -> (3.6, 9) projected
  line L4 (3.6, 9) -> (3.6, 2) projected
  line L5 (3.6, 2) -> (4.4, 2) projected
  line L6 (4.4, 2) -> (4.4, -7) projected
  line L7 (4.4, -7) -> (-4.6, -7) projected
  circle A0 centre (10.4, -3.2) radius 1.2 projected
  circle A1 centre (-10.4, 9.8) radius 1.2 projected
  circle A2 centre (10.4, 9.8) radius 1.2 projected
  circle A3 centre (-10.4, -3.2) radius 1.2 projected
  line L8 (10.6, 12) -> (-10.6, 12) projected
  arc A4 (-10.6, 12) -> (-12.6, 10) centre (-10.6, 10) ccw projected
  line L9 (-12.6, 10) -> (-12.6, -10) projected
  arc A5 (-12.6, -10) -> (-10.6, -12) centre (-10.6, -10) ccw projected
  line L10 (-10.6, -12) -> (10.6, -12) projected
  arc A6 (10.6, -12) -> (12.6, -10) centre (10.6, -10) ccw projected
  line L11 (12.6, -10) -> (12.6, 10) projected
  arc A7 (12.6, 10) -> (10.6, 12) centre (10.6, 10) ccw projected
  line L12 (-13.4, 12.8) -> (-7.4, 12.8)
  line L13 (-7.4, 12.8) -> (-7.4, -32)
  line L14 (-7.4, -32) -> (-13.4, -32)
  line L15 (-13.4, -32) -> (-13.4, 12.8)
  line L16 (-29.7194, -32) -> (65.29, -32) projected
  line L17 (7.4, 12.8) -> (13.4, 12.8)
  line L18 (13.4, 12.8) -> (13.4, -32)
  line L19 (13.4, -32) -> (7.4, -32)
  line L20 (7.4, -32) -> (7.4, 12.8)
  point P0 (29.2806, -35)
  dimension "d67" = 3
  dimension "d68" = 3
  dimension "d69" = 3
  dimension "d70" = 0
  dimension "d79" = 3
  dimension "d80" = 3
  dimension "d81" = 3
  dimension "d82" = 0
extrude "Extrusion18" add sketch "Sketch20" along normal blind 2 contours A7 L11 A6 L10 L20 L8 | L8 L20 L17 L18 L16 L10 A6 L11 A7 | L13 L10 A5 L9 A4 L8 | L8 A4 L9 A5 L10 L13 L14 L15 L12
sketch "Sketch21" plane through (29.2806, 102.08, 35) normal (0, -1, 0) x (1, 0, 0)
  line L0 (13.4, 12.8) -> (13.4, -32) projected
  line L1 (7.4, -14.5) -> (13.4, -14.5)
  line L2 (13.4, -14.5) -> (13.4, -32)
  line L3 (13.4, -32) -> (7.4, -32)
  line L4 (7.4, -32) -> (7.4, -14.5)
  line L5 (-65.29, -32) -> (29.7194, -32) projected
  line L6 (7.4, 12.8) -> (7.4, -32) projected
  line L7 (-13.4, -32) -> (-13.4, 12.8) projected
  line L8 (21.7288, -32) -> (-57.29, -32) projected
  line L9 (-13.4, -14.5) -> (-7.4, -14.5)
  line L10 (-7.4, -14.5) -> (-7.4, -32)
  line L11 (-7.4, -32) -> (-13.4, -32)
  line L12 (-13.4, -32) -> (-13.4, -14.5)
  line L13 (-7.4, -32) -> (-7.4, 12.8) projected
  point P0 (-29.2806, -35)
  dimension "d73" = 0
  dimension "d74" = 0
  dimension "d83" = 0
  dimension "d84" = 17.5
  dimension "d85" = 17.5
extrude "Extrusion19" add sketch "Sketch21" along normal blind 17.5
sketch "Sketch22" plane through (42.6806, 102.08, 47.8) normal (1, 0, 0) x (0, 0, -1)
  line L0 (44.8, -17.5) -> (27.3, -17.5) projected
  line L1 (27.3, -17.5) -> (44.8, -17.5)
  line L2 (27.3, 0) -> (27.3, -17.5) projected
  line L3 (44.8, -17.5) -> (27.3, 0)
  line L4 (27.3, 0) -> (27.3, -17.5)
  point P0 (47.8, -102.08)
extrude "Extrusion20" cut sketch "Sketch22" against normal through all
equation "\"d14\" = d13"
equation "\"d15\" = d13"
equation "\"d16\" = d13"
equation "\"d68\" = d67"
equation "\"d69\" = d67"
equation "\"d79\" = d67"
equation "\"d80\" = d79"
equation "\"d81\" = d79"
properties part number "chassis-akksi"
